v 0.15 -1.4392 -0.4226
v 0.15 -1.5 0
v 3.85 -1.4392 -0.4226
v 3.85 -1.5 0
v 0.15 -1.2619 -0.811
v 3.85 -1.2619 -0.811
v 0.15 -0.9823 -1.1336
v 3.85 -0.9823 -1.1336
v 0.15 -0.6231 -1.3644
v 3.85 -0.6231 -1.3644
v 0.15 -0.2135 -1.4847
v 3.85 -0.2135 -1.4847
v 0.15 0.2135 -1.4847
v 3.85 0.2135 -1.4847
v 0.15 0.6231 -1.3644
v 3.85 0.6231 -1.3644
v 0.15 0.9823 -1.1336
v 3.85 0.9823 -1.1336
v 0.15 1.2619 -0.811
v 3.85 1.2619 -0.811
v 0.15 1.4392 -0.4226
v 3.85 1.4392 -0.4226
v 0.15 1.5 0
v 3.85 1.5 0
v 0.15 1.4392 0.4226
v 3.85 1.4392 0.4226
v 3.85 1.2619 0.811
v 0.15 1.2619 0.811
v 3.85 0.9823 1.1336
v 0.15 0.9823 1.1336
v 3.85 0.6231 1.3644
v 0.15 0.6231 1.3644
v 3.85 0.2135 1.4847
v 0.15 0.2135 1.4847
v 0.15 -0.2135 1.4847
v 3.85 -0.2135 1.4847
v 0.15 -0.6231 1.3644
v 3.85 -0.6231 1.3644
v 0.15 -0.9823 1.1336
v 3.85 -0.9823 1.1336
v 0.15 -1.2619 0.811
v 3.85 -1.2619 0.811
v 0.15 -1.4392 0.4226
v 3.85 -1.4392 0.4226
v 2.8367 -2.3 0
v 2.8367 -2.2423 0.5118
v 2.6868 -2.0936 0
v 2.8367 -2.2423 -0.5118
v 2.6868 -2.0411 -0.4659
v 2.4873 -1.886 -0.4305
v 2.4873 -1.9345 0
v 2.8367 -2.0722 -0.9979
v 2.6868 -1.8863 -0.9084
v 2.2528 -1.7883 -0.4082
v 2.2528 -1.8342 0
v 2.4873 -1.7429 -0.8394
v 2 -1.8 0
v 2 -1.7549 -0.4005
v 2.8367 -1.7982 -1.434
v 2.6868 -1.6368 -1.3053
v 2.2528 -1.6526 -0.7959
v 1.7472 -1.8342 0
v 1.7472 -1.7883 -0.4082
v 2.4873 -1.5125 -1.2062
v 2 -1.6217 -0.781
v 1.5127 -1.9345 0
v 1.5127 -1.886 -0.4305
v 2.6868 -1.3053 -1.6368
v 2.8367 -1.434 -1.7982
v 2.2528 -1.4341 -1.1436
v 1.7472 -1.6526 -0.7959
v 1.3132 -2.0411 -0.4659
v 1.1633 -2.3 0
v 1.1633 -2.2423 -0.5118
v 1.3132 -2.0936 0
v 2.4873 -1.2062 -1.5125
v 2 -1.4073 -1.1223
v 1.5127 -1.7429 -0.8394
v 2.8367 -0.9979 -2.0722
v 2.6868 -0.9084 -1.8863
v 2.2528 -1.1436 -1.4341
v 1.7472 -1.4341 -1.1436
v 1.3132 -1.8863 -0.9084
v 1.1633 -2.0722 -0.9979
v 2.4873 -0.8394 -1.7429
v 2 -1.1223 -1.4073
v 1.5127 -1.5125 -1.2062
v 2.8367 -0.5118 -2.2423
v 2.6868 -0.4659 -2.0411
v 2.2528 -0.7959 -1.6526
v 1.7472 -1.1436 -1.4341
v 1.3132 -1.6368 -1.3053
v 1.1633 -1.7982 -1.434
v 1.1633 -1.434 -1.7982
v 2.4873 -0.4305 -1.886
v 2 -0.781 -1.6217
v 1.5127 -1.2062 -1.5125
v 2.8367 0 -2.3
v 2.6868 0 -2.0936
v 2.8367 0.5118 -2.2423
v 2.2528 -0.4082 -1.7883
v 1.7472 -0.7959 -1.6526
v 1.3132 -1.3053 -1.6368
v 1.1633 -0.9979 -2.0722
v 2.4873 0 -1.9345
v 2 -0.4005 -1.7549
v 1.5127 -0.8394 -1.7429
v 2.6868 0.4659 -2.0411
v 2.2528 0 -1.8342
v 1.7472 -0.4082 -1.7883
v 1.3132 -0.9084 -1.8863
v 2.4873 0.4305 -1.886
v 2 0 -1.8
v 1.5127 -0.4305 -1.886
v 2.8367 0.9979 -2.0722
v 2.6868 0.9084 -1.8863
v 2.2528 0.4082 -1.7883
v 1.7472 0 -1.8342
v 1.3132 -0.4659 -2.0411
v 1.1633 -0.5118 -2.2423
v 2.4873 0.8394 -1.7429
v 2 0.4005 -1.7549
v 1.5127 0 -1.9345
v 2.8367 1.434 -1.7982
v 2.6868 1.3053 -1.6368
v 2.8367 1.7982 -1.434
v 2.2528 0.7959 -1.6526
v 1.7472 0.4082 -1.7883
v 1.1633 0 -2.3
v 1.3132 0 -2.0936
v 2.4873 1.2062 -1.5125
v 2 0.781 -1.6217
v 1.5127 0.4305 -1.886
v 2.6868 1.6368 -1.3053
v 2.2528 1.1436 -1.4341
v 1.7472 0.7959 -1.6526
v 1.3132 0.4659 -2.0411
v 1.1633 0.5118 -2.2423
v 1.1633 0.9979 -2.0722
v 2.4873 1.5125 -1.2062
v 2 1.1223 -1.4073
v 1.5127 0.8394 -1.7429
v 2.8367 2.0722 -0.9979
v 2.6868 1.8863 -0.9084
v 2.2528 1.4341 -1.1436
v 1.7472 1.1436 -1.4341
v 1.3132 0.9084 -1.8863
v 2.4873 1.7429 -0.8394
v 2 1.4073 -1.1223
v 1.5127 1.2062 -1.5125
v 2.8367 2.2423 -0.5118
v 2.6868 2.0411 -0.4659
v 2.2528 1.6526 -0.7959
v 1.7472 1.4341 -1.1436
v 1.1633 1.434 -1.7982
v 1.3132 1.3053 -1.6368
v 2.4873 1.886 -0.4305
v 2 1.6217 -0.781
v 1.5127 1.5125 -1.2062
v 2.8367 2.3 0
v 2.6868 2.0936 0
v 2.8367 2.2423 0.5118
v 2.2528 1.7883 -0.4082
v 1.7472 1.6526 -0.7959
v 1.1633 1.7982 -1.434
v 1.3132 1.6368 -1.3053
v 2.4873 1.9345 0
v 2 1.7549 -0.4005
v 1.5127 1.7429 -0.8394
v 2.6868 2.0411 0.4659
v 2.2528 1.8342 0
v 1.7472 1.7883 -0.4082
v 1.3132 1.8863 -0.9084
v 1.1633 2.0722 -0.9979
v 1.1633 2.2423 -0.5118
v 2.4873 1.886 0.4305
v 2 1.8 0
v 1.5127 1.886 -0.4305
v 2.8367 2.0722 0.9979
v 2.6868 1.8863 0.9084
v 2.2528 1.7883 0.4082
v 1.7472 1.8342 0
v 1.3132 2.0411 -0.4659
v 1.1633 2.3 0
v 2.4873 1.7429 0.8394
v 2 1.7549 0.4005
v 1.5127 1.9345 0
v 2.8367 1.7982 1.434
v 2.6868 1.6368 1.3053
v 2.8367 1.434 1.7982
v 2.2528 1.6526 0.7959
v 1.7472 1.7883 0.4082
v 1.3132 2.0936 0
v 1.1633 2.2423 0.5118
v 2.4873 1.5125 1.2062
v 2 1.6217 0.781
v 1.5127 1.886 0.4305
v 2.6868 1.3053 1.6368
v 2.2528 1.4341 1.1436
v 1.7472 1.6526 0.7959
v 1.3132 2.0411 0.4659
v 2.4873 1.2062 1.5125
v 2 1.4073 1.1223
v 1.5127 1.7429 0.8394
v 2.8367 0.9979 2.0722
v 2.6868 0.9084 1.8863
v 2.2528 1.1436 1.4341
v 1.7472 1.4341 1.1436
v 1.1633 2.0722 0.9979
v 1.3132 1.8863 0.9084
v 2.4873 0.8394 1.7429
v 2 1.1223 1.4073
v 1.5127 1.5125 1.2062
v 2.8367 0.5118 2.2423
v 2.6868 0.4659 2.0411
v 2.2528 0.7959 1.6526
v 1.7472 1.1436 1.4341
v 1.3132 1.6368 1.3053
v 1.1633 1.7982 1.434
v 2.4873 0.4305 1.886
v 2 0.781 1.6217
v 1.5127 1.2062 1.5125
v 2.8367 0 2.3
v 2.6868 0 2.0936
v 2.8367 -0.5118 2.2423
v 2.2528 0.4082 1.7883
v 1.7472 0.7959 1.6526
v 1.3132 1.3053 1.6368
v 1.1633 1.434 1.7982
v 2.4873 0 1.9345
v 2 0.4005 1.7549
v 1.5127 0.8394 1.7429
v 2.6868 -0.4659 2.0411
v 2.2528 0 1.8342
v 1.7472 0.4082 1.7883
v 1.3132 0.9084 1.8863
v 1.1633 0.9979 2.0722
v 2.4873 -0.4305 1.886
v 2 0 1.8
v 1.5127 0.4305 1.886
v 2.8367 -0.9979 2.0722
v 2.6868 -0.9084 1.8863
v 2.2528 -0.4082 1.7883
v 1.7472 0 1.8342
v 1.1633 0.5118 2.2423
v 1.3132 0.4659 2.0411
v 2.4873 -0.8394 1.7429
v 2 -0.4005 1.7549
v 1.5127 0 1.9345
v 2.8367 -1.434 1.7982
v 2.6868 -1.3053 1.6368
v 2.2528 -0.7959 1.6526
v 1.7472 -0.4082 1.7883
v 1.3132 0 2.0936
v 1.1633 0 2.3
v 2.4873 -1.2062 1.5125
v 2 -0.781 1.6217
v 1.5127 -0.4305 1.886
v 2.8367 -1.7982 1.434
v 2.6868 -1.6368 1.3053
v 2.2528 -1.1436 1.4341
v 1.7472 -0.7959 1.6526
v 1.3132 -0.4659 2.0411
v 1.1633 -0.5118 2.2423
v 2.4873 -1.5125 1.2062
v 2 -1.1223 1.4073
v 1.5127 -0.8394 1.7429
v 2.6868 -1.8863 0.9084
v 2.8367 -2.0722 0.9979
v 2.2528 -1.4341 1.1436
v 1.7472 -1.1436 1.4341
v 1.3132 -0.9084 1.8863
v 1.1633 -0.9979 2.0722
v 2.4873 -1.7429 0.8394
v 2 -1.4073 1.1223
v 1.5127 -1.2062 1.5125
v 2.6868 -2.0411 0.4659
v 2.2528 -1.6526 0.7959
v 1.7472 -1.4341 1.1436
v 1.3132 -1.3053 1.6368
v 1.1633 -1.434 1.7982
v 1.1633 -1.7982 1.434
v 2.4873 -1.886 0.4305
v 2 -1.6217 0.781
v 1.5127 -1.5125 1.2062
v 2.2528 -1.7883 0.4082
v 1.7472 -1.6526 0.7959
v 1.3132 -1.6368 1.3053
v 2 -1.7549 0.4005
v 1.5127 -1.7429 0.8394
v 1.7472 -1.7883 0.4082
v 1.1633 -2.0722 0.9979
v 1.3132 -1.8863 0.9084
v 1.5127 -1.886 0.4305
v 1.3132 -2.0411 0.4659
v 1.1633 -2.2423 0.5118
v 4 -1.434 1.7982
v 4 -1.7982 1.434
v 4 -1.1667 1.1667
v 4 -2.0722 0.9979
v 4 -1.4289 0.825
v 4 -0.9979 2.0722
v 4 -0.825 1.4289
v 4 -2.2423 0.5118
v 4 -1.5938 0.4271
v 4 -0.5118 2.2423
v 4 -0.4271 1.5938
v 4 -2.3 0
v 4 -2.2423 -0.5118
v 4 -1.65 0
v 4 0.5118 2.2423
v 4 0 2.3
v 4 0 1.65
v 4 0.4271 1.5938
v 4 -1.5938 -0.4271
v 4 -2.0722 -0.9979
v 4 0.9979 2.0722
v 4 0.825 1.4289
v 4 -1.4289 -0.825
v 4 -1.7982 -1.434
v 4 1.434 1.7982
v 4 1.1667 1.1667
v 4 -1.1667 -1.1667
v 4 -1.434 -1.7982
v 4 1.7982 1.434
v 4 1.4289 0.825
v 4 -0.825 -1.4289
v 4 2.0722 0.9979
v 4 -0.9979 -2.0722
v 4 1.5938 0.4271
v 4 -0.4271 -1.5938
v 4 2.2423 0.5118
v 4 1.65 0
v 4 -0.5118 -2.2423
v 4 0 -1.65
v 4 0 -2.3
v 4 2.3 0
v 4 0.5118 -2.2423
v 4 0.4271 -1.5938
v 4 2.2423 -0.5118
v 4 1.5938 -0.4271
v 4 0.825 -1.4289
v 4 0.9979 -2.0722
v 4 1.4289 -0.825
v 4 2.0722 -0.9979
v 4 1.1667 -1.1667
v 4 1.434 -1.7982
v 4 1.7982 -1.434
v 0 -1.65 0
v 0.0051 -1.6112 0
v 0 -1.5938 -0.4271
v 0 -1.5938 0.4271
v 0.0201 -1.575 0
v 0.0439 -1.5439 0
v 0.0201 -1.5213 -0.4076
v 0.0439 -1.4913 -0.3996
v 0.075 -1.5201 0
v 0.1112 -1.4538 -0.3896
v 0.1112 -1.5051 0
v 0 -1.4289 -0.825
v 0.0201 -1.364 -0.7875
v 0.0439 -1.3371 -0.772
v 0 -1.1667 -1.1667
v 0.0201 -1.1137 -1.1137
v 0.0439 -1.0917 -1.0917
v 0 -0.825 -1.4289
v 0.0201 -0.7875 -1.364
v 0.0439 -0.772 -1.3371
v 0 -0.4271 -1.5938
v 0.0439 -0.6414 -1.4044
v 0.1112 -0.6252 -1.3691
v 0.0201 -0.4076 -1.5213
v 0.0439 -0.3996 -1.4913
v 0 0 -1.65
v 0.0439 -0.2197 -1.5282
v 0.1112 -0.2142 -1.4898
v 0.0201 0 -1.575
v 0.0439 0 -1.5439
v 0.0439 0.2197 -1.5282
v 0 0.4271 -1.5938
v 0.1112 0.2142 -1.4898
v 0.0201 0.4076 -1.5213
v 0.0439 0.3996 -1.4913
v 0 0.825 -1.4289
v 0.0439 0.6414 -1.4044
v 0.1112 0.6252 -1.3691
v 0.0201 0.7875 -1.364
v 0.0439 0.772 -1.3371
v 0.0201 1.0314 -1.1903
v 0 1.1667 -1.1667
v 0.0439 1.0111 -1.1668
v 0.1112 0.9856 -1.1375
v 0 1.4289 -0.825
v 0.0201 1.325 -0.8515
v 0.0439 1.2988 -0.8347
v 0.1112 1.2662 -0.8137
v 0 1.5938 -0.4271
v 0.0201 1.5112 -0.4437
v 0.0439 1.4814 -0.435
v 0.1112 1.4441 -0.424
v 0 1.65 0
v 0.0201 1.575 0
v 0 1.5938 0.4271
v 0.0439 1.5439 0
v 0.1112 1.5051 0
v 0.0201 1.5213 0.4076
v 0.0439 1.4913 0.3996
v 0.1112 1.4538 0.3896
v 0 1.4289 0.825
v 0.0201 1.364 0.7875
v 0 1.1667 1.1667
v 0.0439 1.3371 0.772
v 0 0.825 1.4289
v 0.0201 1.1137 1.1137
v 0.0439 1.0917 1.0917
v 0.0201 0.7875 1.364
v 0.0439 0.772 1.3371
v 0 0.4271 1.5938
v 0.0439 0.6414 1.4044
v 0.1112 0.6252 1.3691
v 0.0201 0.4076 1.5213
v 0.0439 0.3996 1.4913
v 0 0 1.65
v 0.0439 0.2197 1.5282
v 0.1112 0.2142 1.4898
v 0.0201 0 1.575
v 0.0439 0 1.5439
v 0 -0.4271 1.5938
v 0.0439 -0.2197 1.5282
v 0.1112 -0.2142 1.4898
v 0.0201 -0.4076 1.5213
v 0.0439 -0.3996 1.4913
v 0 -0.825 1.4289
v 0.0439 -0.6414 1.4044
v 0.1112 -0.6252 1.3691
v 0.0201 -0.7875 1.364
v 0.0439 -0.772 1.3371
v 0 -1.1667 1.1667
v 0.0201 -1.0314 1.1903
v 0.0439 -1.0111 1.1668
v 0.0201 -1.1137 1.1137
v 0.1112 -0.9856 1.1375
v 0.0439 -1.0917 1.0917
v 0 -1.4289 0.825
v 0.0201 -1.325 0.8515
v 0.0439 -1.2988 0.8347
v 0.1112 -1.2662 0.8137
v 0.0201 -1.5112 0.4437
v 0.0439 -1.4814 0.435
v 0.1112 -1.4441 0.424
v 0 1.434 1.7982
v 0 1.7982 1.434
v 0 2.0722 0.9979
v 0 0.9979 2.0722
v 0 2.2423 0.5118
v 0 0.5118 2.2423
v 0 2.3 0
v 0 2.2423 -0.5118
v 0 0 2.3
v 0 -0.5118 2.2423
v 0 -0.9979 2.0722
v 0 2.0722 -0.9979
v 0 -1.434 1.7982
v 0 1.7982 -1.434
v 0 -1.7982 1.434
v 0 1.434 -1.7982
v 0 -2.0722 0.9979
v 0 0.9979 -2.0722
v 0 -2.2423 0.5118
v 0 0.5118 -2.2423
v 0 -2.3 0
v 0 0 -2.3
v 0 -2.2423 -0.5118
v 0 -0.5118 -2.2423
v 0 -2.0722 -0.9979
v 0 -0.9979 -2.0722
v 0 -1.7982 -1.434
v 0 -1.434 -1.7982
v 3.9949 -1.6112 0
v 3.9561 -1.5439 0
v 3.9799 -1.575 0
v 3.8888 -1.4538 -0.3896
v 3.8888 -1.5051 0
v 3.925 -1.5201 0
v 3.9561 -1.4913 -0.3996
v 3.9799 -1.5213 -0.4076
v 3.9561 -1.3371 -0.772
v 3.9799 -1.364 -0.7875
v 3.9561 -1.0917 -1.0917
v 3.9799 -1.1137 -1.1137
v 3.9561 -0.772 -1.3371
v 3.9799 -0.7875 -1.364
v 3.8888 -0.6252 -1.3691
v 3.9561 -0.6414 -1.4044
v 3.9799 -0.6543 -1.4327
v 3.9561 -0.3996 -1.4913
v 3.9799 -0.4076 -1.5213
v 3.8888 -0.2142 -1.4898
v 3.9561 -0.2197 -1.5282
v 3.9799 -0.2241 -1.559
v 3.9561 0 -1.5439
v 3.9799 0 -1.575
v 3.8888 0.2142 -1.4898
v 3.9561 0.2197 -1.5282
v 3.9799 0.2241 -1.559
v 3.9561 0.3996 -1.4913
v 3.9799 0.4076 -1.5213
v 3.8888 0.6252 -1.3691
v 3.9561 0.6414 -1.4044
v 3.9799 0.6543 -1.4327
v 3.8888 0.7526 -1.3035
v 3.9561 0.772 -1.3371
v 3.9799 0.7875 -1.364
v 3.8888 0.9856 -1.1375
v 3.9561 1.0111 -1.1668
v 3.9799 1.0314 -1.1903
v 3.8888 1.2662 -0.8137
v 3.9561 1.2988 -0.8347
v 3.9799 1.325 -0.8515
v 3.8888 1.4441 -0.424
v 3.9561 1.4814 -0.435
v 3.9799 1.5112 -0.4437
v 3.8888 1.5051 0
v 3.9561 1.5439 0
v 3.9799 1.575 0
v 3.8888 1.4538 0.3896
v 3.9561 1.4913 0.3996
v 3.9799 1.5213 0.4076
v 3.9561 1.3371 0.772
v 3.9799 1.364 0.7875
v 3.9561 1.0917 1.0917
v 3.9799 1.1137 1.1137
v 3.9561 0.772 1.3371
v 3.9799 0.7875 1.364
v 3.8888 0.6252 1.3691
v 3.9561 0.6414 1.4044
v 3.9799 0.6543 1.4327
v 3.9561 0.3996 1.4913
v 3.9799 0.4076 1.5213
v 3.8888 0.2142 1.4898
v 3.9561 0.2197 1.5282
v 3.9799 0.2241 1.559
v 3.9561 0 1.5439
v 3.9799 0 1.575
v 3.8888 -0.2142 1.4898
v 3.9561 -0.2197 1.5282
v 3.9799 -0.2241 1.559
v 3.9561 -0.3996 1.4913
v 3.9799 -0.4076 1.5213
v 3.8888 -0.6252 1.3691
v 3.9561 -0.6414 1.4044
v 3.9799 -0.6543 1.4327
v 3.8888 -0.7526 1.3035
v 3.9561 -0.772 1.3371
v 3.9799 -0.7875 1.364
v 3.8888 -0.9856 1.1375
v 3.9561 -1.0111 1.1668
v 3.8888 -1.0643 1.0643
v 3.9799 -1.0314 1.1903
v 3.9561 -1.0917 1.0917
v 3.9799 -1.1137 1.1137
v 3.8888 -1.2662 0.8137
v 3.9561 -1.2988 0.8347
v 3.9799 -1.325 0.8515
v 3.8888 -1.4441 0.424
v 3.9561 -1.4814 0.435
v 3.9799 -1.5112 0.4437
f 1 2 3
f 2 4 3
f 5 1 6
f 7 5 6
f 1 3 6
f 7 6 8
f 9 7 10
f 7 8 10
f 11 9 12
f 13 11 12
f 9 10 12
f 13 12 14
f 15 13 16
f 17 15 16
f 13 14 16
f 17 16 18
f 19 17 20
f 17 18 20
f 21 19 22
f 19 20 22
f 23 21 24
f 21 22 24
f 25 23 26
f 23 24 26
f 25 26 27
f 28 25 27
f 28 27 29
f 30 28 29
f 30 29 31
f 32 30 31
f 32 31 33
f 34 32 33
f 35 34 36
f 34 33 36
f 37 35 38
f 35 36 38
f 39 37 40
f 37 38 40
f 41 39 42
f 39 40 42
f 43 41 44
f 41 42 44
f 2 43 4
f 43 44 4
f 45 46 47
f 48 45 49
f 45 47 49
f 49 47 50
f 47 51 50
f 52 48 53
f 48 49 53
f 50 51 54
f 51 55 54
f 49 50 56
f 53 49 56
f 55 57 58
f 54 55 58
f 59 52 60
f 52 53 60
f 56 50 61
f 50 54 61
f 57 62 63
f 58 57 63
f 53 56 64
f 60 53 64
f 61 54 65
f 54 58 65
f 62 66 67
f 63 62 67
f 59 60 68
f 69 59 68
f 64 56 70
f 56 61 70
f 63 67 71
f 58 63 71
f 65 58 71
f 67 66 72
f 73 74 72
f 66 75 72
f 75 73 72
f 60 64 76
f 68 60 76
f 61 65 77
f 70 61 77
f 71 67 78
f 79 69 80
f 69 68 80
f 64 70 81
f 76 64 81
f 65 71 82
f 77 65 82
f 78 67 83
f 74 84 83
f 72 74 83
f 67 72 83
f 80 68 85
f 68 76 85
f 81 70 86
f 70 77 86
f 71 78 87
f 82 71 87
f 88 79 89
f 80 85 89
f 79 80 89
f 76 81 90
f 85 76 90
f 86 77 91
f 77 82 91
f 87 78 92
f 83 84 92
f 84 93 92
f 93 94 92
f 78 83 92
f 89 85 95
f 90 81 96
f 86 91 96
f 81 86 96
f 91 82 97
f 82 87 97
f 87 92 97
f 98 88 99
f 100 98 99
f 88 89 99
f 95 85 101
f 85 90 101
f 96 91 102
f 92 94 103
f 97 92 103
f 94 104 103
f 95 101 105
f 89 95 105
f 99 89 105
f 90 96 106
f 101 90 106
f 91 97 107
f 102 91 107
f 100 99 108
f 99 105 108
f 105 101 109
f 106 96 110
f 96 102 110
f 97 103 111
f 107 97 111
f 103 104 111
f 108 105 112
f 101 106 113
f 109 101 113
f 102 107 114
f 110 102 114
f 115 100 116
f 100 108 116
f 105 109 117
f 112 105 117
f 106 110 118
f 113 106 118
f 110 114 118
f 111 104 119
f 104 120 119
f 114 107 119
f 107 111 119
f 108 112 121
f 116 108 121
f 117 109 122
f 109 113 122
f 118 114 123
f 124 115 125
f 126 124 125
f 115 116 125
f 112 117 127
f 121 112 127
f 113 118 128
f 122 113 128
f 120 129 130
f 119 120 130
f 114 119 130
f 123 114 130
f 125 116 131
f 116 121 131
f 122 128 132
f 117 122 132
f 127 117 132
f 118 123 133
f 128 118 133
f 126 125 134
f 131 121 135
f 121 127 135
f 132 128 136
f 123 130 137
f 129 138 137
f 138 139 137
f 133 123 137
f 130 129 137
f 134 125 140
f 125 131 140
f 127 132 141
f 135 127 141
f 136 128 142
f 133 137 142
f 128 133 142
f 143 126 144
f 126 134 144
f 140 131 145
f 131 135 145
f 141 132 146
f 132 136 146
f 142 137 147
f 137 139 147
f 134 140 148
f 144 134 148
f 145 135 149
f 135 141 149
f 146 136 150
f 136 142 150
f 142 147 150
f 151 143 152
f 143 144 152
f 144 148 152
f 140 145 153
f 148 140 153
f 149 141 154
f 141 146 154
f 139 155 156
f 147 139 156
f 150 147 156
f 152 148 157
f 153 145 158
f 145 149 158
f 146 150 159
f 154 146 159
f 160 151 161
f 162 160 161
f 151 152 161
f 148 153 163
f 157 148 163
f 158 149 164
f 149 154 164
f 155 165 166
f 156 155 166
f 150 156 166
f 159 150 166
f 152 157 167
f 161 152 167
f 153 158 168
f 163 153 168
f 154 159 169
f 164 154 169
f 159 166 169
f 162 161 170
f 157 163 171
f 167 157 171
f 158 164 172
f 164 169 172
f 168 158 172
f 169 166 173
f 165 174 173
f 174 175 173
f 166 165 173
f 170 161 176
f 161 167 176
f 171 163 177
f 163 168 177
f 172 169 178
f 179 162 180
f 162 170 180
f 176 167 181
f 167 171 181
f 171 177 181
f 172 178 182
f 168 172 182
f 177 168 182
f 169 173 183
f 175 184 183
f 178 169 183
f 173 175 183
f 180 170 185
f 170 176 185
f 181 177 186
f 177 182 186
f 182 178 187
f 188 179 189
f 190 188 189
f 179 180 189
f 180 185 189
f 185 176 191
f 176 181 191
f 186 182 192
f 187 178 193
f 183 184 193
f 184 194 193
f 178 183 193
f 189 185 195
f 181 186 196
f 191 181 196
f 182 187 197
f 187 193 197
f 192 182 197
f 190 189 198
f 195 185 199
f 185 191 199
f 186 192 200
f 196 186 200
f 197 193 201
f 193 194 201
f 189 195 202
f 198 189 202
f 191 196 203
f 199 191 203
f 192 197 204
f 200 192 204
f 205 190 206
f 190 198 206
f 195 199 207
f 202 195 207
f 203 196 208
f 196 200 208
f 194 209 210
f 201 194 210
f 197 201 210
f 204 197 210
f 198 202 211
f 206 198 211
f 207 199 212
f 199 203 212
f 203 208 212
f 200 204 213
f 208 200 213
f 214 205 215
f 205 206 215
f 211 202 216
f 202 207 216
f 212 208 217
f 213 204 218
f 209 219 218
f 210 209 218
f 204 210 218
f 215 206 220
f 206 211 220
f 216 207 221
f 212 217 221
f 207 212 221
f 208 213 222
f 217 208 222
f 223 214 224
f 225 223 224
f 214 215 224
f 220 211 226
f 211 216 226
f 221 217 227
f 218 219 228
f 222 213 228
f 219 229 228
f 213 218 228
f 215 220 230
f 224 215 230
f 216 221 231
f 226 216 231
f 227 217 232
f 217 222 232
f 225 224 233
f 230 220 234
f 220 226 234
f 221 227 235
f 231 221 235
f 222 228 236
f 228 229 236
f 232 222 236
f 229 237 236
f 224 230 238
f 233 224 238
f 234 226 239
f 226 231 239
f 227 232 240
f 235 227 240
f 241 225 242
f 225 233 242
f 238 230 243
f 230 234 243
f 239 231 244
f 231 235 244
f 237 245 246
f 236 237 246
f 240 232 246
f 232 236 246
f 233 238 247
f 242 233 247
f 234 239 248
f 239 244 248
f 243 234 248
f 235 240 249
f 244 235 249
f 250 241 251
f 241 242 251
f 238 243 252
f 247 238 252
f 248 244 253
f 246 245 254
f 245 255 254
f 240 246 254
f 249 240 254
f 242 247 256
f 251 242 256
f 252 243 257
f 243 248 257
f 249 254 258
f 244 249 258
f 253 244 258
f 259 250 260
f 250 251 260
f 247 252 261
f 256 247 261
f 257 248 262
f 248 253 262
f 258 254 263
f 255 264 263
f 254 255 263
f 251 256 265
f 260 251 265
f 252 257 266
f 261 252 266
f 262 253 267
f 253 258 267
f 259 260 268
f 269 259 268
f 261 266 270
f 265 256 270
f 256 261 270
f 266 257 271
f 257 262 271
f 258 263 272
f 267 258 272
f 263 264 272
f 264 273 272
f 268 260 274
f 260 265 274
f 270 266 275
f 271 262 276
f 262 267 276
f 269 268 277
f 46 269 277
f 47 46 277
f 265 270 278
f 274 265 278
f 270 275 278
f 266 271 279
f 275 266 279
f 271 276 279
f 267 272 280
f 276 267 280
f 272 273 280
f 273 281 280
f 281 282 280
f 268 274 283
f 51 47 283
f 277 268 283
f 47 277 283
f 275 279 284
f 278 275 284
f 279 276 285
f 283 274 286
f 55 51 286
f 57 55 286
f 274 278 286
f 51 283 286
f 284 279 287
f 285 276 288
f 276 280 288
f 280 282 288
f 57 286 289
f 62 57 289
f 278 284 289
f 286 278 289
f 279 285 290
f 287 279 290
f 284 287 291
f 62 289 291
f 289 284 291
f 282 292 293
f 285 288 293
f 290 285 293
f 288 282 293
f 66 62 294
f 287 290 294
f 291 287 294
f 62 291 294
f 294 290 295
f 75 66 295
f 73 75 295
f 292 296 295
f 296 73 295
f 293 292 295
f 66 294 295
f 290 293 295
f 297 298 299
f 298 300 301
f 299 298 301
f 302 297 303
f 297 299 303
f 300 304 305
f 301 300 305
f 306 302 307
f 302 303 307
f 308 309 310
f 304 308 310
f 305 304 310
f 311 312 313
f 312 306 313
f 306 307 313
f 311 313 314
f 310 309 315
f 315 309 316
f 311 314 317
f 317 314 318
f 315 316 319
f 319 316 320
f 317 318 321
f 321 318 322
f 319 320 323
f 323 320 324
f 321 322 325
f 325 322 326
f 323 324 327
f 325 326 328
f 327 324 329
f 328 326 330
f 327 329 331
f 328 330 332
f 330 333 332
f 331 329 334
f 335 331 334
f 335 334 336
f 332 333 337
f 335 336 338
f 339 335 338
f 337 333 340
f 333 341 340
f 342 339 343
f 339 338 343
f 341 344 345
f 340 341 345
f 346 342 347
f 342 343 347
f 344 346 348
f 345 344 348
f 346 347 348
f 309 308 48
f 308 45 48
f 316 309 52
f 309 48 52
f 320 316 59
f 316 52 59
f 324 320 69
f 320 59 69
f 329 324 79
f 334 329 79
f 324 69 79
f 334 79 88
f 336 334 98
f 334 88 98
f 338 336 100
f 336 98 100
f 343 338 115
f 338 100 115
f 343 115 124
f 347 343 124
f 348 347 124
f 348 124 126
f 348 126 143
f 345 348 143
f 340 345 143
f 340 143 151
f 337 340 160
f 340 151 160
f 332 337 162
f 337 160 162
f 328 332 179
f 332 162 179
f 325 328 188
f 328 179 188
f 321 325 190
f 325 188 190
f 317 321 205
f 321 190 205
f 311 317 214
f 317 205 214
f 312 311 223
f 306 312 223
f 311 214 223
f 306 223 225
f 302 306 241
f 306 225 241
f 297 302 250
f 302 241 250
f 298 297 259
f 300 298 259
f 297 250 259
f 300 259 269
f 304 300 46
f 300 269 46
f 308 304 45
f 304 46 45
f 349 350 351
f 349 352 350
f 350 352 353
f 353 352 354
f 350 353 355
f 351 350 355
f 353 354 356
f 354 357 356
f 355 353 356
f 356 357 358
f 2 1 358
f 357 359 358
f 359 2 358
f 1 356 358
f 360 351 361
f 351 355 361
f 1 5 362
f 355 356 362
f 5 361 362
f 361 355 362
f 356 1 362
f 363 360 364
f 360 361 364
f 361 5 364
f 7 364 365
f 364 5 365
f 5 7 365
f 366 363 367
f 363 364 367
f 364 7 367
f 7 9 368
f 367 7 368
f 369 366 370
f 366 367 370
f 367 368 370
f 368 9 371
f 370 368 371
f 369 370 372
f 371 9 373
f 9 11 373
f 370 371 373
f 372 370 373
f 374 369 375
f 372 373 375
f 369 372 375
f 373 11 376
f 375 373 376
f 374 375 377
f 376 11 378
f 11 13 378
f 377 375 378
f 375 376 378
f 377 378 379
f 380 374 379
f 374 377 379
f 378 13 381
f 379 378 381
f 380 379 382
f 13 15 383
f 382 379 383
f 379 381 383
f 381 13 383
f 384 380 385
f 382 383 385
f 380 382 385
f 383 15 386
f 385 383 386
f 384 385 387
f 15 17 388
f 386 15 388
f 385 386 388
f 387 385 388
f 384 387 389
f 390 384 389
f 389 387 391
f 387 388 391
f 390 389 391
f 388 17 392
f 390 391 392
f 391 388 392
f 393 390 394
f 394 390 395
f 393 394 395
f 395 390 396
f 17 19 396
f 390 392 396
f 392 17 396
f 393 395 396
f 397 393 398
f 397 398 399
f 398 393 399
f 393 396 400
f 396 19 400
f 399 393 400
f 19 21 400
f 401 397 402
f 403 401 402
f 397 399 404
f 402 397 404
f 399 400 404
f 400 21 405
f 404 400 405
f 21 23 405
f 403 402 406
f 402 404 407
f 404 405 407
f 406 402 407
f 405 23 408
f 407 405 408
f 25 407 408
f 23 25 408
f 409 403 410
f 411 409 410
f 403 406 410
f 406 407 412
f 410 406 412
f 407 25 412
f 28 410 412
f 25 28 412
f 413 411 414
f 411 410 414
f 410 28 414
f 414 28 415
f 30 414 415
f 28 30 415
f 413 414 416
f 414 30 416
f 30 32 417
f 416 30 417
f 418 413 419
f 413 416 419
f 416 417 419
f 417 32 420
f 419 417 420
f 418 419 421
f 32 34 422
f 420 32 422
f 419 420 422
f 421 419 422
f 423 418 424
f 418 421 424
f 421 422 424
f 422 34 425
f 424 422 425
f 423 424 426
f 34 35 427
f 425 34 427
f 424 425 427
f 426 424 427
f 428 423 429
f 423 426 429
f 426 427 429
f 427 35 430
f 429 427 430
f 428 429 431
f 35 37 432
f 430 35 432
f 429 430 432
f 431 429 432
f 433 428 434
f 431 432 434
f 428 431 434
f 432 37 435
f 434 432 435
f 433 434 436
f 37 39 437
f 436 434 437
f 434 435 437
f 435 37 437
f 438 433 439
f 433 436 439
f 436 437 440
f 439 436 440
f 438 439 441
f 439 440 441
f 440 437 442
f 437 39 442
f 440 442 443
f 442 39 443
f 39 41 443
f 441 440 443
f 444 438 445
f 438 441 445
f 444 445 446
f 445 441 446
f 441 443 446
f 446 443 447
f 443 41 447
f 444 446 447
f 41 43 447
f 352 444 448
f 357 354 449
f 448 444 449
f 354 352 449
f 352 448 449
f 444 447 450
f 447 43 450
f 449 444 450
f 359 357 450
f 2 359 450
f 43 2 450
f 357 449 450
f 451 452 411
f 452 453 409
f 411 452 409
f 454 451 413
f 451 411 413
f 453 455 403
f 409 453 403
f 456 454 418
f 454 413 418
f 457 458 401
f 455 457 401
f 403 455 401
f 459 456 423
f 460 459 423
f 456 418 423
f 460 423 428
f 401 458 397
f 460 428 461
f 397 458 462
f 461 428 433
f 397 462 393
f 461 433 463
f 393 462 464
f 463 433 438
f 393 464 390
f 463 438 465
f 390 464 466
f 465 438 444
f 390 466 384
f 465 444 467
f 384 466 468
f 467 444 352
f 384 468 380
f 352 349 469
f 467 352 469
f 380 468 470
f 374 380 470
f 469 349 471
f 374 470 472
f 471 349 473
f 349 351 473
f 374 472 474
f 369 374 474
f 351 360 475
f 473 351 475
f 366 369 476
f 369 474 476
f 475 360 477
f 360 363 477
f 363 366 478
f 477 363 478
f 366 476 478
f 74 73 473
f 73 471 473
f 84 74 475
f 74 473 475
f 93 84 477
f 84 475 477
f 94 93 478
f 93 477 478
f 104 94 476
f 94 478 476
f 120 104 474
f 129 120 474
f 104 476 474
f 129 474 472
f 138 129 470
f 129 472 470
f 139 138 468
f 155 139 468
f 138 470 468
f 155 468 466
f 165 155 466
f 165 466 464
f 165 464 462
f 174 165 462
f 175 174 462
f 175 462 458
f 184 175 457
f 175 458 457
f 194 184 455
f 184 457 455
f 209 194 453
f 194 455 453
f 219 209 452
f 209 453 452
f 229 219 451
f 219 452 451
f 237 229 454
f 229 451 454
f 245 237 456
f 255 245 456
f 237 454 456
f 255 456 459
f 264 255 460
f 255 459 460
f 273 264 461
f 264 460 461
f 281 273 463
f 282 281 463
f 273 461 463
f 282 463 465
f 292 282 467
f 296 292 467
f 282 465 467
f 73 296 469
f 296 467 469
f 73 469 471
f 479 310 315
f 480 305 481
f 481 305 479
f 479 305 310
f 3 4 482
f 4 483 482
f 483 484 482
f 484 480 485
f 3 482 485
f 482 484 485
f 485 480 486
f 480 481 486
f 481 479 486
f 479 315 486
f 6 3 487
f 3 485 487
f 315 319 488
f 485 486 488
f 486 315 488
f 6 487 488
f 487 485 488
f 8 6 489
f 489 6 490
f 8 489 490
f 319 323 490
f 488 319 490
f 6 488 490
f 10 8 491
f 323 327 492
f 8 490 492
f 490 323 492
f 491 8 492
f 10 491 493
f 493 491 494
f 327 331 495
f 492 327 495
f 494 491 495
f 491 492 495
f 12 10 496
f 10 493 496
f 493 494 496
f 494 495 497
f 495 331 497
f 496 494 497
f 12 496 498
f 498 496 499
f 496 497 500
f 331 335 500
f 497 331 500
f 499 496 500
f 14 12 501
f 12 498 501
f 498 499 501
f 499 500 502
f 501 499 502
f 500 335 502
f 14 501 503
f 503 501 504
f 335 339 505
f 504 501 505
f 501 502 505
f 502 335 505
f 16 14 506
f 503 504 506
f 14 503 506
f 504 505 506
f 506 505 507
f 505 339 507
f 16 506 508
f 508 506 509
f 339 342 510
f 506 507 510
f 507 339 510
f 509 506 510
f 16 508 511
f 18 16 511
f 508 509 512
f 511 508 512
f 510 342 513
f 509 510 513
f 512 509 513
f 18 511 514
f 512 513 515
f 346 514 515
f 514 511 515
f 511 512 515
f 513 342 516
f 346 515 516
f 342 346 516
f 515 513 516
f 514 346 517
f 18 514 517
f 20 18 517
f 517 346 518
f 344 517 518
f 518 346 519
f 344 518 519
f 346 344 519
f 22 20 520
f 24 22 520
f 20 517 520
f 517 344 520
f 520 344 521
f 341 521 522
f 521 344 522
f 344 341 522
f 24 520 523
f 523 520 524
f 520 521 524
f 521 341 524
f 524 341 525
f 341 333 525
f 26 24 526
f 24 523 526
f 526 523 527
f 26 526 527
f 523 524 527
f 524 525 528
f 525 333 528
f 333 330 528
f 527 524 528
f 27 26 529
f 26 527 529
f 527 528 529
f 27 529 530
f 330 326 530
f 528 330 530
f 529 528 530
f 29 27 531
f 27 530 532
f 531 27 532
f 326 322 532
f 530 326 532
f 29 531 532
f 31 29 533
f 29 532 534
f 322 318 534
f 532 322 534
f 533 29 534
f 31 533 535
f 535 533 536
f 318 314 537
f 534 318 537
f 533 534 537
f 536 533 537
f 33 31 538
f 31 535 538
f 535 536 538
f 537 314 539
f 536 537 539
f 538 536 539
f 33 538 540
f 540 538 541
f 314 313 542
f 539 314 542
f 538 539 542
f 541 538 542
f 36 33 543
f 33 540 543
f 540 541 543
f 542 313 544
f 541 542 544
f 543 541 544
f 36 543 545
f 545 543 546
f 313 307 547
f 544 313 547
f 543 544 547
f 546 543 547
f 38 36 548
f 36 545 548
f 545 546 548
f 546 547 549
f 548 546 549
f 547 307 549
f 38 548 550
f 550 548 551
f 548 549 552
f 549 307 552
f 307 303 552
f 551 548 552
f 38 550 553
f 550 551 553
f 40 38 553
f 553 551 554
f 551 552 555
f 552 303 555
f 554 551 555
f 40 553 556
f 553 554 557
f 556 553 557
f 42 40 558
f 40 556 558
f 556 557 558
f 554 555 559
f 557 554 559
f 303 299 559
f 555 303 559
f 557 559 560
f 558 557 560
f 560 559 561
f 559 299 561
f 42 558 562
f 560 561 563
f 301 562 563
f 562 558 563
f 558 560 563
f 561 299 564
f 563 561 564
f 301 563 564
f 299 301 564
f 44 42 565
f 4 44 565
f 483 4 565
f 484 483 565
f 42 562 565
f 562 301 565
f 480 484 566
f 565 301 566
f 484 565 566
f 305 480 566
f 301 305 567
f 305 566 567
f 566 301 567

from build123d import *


with BuildPart() as part:
    # Esquisse1 → Révolution1 (revolve)
    with BuildSketch(Plane.XY, mode=Mode.PRIVATE) as r_volution1_sk:
        with BuildLine():
            Line((0.15, 1.5), (3.85, 1.5))
            ThreePointArc((3.85, 1.5), (3.956066017, 1.543933983), (4, 1.65))
            Line((4, 1.65), (4, 2.3))
            Line((4, 2.3), (2.836660027, 2.3))
            ThreePointArc((2.836660027, 2.3), (2, 1.8), (1.163339973, 2.3))
            Line((1.163339973, 2.3), (0, 2.3))
            Line((0, 2.3), (0, 1.65))
            ThreePointArc((0, 1.65), (0.043933983, 1.543933983), (0.15, 1.5))
        make_face()
    revolve(r_volution1_sk.sketch.rotate(Axis((0, 0, 0), (1, 0, 0)), 180), axis=Axis((0, 0, 0), (1, 0, 0)))


solid = part.part
